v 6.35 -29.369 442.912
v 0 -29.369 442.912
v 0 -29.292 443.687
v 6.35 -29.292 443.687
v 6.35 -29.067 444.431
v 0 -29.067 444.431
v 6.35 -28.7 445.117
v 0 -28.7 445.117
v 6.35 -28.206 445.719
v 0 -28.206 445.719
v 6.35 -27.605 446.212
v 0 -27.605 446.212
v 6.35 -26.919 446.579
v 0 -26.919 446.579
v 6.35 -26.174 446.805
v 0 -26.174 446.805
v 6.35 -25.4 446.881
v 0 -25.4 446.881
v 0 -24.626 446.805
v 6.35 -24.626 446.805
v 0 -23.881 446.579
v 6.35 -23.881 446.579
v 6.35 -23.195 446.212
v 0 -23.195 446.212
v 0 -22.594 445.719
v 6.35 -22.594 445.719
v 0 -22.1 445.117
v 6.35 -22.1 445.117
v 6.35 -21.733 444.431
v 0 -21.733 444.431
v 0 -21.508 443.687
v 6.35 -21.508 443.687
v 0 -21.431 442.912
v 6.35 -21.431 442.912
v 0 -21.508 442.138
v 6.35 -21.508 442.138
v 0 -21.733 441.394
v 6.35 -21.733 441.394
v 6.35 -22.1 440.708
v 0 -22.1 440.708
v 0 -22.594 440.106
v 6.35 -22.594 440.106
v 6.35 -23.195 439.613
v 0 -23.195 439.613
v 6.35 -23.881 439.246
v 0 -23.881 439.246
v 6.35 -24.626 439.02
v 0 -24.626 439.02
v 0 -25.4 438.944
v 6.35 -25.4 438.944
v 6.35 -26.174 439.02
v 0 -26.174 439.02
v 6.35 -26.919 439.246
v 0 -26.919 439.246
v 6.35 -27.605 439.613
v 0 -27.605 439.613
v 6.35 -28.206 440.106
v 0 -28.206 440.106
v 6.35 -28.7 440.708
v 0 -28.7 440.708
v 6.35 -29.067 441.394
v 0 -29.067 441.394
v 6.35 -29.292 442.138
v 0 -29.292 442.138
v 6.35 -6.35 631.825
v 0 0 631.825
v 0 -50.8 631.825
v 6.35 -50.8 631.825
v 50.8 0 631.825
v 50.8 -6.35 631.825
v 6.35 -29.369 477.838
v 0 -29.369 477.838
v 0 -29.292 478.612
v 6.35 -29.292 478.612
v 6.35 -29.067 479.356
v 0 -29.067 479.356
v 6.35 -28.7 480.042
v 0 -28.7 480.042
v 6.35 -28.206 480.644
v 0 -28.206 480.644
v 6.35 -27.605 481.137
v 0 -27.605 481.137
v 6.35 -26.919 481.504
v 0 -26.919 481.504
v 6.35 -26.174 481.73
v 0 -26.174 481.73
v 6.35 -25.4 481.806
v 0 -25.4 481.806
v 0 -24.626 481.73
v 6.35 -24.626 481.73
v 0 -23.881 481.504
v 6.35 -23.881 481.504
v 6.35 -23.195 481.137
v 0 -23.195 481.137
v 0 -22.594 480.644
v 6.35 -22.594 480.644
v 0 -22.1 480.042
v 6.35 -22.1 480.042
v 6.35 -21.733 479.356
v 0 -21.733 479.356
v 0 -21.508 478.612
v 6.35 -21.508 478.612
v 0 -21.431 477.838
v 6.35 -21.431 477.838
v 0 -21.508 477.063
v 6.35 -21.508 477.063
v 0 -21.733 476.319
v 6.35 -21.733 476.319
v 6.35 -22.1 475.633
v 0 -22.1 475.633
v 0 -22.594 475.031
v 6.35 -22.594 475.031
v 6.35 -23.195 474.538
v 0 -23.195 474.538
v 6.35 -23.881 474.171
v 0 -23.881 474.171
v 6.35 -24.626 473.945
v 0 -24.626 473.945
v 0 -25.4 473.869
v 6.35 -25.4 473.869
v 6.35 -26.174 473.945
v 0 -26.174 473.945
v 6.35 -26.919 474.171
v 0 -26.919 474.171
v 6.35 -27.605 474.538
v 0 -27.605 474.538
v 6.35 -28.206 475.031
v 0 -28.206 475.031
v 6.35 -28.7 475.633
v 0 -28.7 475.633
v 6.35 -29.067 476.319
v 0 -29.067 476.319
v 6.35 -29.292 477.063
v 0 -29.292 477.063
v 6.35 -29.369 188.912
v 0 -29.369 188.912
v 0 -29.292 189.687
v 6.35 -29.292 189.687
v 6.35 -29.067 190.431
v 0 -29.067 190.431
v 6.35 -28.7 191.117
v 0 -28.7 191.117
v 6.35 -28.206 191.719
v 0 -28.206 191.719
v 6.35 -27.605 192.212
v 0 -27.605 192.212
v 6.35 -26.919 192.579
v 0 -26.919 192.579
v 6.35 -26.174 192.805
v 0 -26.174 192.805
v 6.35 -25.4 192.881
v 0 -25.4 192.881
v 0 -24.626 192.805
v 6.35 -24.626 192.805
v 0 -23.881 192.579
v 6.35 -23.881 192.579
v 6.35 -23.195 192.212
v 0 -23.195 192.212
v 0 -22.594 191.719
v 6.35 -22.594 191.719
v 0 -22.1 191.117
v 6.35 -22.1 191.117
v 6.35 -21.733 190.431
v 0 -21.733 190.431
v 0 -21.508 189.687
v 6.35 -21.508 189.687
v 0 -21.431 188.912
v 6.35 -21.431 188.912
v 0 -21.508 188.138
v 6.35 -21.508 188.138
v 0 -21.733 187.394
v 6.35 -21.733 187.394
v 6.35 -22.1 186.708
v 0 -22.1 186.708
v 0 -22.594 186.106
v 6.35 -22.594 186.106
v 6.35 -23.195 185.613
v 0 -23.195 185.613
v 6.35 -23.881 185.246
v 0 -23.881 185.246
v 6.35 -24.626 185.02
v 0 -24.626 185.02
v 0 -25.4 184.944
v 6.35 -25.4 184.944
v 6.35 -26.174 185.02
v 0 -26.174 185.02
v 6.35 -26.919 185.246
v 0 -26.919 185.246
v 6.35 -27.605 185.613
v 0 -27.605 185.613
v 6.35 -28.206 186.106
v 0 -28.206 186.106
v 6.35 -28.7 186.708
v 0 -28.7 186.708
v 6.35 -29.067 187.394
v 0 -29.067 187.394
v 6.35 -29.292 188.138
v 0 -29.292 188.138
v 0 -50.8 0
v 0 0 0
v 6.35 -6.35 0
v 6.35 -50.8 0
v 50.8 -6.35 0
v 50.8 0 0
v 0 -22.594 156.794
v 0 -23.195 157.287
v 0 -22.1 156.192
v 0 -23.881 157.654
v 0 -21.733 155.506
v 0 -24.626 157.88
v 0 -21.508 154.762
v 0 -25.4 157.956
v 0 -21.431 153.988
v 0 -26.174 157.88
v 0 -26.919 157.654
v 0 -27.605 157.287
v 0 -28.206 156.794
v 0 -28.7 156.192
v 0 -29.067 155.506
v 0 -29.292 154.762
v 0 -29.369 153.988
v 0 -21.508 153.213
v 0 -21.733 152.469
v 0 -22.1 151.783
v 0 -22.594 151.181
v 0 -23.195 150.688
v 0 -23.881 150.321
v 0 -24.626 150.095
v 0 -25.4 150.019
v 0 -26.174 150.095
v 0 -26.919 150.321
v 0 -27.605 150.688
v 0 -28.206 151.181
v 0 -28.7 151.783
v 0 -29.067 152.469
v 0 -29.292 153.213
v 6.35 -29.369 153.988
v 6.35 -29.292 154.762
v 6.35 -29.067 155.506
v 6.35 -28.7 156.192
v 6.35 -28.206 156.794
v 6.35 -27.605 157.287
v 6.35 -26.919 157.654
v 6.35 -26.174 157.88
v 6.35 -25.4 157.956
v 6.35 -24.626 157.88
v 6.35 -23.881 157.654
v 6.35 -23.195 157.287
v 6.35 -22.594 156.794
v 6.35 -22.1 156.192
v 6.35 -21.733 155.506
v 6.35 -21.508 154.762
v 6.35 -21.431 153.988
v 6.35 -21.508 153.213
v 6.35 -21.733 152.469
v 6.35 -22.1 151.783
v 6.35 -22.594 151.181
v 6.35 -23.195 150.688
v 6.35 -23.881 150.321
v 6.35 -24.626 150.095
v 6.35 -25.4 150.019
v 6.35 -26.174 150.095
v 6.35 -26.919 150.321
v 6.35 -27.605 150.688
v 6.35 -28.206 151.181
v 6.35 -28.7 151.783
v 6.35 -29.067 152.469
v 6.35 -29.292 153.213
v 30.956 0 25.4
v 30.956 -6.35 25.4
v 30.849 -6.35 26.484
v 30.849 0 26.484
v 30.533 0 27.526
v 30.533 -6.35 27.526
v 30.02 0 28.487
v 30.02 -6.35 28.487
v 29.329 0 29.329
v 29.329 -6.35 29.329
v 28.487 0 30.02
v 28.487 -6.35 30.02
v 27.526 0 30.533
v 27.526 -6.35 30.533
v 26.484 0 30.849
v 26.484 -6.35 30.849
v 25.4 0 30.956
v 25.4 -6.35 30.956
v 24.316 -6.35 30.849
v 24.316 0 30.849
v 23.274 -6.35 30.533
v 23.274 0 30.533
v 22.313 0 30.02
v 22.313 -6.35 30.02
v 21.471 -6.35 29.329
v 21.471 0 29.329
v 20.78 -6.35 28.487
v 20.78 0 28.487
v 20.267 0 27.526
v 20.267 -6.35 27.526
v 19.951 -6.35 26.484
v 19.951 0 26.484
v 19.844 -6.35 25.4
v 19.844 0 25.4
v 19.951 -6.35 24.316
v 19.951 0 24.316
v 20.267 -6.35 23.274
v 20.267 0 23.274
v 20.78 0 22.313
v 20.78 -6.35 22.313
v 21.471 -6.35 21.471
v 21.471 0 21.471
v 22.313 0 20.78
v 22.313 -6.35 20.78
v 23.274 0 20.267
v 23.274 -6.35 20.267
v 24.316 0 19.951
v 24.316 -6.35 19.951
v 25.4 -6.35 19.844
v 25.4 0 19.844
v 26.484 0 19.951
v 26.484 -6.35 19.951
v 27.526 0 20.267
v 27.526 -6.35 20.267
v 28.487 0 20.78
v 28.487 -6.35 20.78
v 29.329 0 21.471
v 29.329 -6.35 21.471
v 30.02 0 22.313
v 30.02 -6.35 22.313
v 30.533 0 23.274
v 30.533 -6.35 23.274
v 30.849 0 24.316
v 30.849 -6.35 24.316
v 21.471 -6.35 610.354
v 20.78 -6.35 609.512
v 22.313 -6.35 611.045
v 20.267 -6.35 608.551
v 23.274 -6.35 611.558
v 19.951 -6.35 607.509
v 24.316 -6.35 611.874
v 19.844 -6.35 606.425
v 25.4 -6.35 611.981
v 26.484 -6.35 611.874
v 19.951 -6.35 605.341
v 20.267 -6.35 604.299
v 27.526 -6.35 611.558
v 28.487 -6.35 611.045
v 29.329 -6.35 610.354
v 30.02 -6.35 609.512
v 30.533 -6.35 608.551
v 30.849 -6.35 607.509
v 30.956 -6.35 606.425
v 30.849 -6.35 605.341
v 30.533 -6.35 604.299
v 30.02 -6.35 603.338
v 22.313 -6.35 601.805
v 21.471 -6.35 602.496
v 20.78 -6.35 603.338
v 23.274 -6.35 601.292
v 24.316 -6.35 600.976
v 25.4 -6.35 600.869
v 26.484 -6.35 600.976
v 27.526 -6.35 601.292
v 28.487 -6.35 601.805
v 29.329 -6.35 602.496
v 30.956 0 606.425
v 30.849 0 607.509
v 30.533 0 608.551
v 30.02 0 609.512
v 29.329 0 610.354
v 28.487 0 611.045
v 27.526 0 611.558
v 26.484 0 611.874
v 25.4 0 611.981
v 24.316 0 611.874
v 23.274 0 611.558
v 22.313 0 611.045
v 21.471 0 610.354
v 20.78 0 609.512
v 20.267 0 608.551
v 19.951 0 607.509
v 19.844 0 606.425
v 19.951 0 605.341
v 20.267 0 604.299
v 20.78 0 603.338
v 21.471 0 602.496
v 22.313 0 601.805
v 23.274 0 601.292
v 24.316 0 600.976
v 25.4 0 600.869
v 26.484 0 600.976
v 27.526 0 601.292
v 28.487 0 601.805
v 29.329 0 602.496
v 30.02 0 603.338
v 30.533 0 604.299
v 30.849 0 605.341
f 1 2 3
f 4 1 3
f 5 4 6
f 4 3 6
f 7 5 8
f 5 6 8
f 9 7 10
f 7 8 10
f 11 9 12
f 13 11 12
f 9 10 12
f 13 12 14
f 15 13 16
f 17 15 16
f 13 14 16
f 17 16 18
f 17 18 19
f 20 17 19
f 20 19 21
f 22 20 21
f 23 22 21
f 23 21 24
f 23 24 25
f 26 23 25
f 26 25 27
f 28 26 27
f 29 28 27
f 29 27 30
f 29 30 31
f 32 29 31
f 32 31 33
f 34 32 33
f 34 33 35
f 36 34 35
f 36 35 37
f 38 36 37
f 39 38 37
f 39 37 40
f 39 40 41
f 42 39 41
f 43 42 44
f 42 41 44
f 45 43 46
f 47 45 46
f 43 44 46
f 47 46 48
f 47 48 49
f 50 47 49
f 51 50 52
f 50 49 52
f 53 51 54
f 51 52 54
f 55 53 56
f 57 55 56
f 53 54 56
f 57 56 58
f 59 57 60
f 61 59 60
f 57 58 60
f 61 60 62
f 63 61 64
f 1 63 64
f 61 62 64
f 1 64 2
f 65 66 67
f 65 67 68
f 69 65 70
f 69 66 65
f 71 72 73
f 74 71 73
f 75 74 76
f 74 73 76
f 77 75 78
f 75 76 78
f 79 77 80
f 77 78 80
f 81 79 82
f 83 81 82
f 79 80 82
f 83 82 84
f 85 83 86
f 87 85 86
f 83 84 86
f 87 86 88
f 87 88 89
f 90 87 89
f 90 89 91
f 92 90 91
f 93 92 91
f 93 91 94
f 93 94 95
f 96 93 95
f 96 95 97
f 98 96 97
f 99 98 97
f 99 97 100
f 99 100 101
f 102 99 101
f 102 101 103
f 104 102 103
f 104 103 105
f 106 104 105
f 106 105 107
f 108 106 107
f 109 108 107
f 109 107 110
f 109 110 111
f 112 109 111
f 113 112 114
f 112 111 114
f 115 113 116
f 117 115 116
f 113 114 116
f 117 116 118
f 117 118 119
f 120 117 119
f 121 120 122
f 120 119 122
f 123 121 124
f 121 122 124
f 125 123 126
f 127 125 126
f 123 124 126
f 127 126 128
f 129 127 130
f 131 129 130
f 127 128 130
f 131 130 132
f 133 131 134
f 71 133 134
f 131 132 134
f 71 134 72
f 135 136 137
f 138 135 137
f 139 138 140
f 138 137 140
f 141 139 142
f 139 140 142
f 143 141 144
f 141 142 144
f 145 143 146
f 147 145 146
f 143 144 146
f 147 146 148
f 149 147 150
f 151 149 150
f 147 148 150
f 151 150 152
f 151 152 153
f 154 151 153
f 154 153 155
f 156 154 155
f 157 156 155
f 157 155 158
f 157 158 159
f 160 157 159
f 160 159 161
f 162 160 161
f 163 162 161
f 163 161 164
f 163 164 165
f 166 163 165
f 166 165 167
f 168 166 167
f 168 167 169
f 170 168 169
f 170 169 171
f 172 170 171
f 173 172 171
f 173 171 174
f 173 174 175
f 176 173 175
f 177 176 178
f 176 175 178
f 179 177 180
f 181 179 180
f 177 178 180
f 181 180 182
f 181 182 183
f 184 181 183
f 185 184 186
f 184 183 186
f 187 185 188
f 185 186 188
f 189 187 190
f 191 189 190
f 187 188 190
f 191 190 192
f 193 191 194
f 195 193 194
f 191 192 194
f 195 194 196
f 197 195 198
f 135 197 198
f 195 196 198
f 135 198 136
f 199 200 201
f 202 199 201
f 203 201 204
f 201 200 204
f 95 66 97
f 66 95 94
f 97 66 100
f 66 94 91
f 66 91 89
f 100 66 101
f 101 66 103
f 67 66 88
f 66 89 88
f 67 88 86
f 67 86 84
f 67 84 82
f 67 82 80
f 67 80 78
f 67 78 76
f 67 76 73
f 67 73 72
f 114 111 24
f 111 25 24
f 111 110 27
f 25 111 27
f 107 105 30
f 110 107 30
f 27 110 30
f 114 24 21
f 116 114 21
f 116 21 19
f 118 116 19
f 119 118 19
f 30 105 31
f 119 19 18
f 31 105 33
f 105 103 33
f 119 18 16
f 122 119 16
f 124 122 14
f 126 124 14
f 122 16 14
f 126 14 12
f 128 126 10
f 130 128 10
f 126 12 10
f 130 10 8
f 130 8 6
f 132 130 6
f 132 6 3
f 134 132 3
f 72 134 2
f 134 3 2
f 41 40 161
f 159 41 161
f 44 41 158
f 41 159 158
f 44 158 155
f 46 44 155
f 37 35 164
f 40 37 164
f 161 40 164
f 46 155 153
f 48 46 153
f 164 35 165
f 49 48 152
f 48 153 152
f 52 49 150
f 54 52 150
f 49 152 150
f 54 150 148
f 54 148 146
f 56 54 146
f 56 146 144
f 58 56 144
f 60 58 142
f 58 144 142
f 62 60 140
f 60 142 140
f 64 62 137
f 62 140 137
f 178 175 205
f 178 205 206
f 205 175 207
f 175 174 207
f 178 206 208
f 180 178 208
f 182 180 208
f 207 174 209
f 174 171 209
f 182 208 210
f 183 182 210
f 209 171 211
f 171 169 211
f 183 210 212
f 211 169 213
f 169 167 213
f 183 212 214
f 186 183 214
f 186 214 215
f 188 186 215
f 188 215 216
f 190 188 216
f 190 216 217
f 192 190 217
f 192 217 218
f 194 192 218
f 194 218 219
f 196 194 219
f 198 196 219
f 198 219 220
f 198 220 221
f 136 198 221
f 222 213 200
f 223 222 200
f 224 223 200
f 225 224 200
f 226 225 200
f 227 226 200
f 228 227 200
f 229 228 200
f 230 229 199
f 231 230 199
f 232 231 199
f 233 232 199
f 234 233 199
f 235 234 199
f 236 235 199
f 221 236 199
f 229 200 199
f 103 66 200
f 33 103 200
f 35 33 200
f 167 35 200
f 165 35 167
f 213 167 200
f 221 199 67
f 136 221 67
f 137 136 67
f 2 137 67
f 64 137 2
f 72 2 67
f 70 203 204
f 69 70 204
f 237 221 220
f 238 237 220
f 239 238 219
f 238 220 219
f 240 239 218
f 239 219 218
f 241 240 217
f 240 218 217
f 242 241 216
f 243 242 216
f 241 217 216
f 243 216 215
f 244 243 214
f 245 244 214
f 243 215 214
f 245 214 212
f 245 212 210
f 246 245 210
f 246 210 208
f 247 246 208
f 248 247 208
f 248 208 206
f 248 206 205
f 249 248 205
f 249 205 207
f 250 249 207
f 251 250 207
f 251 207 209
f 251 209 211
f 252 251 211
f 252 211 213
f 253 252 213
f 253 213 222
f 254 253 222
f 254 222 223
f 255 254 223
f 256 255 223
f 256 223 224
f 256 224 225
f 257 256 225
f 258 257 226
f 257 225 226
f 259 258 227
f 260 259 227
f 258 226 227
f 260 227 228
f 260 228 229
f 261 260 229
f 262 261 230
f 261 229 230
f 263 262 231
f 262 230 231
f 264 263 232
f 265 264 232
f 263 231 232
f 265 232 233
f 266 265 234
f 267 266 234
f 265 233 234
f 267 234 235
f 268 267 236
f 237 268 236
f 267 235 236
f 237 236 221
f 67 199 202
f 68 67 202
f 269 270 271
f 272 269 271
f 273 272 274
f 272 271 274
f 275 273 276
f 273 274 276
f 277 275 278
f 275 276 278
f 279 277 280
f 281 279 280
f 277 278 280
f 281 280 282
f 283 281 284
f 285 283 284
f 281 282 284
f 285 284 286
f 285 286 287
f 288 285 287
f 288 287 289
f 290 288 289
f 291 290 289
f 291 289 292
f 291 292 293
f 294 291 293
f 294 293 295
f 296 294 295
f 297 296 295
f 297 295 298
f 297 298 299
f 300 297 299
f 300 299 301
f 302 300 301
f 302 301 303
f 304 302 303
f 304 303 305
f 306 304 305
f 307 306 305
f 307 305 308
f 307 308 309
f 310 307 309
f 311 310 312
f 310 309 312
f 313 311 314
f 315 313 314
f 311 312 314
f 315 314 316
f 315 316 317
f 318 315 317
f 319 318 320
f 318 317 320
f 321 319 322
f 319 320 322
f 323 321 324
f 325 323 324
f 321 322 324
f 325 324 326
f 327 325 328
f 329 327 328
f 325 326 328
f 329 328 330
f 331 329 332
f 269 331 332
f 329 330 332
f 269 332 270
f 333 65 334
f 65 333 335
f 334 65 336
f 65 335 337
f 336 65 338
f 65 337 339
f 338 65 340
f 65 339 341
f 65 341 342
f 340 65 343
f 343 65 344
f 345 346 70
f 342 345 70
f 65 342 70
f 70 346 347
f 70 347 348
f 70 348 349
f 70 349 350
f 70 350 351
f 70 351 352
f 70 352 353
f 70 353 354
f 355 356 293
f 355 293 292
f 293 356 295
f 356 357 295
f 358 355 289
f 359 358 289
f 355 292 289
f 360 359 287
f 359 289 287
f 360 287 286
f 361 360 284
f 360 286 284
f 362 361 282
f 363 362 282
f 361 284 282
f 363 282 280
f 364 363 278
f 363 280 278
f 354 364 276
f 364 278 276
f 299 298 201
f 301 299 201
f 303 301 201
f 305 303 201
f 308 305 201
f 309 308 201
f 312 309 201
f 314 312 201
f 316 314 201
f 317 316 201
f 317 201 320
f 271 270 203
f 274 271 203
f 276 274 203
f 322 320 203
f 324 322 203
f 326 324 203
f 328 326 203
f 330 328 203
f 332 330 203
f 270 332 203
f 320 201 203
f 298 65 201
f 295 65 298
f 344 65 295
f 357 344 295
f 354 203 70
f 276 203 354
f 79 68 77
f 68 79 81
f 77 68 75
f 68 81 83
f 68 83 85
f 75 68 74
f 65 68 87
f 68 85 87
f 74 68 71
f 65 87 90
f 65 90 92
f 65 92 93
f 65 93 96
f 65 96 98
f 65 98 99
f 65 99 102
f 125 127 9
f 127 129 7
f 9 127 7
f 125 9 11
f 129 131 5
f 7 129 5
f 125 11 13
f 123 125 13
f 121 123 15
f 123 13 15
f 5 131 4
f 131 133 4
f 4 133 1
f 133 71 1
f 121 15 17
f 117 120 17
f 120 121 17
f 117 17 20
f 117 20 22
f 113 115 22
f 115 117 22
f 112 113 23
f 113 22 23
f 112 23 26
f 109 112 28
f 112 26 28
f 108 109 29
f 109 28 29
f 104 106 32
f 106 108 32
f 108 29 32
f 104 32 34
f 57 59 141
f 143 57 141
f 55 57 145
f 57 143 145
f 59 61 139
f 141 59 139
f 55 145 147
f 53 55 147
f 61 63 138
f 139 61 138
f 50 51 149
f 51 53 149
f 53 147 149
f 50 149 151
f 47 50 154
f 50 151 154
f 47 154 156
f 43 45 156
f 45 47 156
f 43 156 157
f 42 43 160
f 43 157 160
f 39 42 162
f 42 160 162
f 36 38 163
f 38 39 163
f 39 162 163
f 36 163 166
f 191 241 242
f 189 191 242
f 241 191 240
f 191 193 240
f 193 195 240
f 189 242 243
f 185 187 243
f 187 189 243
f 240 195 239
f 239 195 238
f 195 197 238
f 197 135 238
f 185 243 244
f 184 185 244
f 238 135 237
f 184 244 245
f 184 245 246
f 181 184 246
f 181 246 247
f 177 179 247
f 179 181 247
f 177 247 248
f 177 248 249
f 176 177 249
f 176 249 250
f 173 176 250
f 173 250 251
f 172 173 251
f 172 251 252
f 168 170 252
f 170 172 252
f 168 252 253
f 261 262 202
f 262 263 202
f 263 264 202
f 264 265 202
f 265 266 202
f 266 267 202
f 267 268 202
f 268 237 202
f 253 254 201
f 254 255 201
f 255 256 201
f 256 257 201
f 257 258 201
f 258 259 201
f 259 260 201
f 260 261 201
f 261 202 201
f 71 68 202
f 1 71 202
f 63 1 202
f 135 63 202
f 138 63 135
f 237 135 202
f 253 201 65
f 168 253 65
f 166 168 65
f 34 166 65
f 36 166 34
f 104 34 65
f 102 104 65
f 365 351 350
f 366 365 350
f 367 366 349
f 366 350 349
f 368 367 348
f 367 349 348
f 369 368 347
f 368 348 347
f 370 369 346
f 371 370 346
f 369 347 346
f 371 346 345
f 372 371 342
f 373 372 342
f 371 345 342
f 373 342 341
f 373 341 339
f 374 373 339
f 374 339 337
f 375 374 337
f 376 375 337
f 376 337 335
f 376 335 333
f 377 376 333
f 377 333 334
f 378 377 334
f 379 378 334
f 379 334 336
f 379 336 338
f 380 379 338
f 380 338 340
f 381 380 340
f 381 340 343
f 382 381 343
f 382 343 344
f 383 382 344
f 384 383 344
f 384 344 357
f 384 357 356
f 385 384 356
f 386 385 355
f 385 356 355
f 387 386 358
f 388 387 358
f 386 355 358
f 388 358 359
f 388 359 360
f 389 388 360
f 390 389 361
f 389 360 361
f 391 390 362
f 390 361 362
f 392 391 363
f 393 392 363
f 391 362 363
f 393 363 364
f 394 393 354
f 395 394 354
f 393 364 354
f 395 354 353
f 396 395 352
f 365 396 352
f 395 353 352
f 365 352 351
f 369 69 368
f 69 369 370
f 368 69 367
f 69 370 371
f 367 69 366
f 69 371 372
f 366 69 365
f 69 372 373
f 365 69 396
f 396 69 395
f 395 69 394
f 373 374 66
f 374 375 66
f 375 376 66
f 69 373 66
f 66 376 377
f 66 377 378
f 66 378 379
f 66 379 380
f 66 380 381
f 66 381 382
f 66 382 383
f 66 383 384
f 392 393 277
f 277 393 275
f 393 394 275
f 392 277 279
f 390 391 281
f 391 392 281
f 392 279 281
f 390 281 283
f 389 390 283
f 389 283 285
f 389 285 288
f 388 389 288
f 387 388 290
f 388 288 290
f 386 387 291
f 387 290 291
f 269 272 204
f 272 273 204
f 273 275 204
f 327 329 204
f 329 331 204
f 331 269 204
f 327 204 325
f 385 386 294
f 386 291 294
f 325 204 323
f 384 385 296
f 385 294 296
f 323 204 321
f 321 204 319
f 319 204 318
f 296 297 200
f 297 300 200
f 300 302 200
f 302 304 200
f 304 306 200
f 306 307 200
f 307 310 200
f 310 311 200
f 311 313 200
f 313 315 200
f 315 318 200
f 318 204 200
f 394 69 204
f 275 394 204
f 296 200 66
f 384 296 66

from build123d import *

# Parameters (mm, degrees)
F1_DEPTH = 631.825
F2_R     = 5.55625
F3_DEPTH = 6.351
F4_R     = 3.96875
F5_DEPTH = 50.801


with BuildPart() as f1:
    # F0 (on Top) → F1 (new body)
    with BuildSketch(Plane.XY):
        Polygon((50.8, 0), (0, 0), (0, -50.8), (6.35, -50.8), (6.35, -6.35), (50.8, -6.35), align=None)
    extrude(amount=F1_DEPTH)

    # F2 (on face) → F3 (cut, through all)
    with BuildSketch(Plane.XZ.offset(6.35)):
        with Locations((25.4, 606.425)):
            Circle(F2_R)
        with Locations((25.4, 25.4)):
            Circle(F2_R)
    extrude(amount=-F3_DEPTH, mode=Mode.SUBTRACT)

    # F4 (on face) → F5 (cut, through all)
    with BuildSketch(Plane(origin=(0, 0, 0), x_dir=(0, -1, 0), z_dir=(-1, 0, 0))):
        with Locations((25.4, 477.8375)):
            Circle(F4_R)
        with Locations((25.4, 153.9875)):
            Circle(F4_R)
        with Locations((25.4, 188.9125)):
            Circle(F4_R)
        with Locations((25.4, 442.9125)):
            Circle(F4_R)
    extrude(amount=-F5_DEPTH, mode=Mode.SUBTRACT)


solid = f1.part
